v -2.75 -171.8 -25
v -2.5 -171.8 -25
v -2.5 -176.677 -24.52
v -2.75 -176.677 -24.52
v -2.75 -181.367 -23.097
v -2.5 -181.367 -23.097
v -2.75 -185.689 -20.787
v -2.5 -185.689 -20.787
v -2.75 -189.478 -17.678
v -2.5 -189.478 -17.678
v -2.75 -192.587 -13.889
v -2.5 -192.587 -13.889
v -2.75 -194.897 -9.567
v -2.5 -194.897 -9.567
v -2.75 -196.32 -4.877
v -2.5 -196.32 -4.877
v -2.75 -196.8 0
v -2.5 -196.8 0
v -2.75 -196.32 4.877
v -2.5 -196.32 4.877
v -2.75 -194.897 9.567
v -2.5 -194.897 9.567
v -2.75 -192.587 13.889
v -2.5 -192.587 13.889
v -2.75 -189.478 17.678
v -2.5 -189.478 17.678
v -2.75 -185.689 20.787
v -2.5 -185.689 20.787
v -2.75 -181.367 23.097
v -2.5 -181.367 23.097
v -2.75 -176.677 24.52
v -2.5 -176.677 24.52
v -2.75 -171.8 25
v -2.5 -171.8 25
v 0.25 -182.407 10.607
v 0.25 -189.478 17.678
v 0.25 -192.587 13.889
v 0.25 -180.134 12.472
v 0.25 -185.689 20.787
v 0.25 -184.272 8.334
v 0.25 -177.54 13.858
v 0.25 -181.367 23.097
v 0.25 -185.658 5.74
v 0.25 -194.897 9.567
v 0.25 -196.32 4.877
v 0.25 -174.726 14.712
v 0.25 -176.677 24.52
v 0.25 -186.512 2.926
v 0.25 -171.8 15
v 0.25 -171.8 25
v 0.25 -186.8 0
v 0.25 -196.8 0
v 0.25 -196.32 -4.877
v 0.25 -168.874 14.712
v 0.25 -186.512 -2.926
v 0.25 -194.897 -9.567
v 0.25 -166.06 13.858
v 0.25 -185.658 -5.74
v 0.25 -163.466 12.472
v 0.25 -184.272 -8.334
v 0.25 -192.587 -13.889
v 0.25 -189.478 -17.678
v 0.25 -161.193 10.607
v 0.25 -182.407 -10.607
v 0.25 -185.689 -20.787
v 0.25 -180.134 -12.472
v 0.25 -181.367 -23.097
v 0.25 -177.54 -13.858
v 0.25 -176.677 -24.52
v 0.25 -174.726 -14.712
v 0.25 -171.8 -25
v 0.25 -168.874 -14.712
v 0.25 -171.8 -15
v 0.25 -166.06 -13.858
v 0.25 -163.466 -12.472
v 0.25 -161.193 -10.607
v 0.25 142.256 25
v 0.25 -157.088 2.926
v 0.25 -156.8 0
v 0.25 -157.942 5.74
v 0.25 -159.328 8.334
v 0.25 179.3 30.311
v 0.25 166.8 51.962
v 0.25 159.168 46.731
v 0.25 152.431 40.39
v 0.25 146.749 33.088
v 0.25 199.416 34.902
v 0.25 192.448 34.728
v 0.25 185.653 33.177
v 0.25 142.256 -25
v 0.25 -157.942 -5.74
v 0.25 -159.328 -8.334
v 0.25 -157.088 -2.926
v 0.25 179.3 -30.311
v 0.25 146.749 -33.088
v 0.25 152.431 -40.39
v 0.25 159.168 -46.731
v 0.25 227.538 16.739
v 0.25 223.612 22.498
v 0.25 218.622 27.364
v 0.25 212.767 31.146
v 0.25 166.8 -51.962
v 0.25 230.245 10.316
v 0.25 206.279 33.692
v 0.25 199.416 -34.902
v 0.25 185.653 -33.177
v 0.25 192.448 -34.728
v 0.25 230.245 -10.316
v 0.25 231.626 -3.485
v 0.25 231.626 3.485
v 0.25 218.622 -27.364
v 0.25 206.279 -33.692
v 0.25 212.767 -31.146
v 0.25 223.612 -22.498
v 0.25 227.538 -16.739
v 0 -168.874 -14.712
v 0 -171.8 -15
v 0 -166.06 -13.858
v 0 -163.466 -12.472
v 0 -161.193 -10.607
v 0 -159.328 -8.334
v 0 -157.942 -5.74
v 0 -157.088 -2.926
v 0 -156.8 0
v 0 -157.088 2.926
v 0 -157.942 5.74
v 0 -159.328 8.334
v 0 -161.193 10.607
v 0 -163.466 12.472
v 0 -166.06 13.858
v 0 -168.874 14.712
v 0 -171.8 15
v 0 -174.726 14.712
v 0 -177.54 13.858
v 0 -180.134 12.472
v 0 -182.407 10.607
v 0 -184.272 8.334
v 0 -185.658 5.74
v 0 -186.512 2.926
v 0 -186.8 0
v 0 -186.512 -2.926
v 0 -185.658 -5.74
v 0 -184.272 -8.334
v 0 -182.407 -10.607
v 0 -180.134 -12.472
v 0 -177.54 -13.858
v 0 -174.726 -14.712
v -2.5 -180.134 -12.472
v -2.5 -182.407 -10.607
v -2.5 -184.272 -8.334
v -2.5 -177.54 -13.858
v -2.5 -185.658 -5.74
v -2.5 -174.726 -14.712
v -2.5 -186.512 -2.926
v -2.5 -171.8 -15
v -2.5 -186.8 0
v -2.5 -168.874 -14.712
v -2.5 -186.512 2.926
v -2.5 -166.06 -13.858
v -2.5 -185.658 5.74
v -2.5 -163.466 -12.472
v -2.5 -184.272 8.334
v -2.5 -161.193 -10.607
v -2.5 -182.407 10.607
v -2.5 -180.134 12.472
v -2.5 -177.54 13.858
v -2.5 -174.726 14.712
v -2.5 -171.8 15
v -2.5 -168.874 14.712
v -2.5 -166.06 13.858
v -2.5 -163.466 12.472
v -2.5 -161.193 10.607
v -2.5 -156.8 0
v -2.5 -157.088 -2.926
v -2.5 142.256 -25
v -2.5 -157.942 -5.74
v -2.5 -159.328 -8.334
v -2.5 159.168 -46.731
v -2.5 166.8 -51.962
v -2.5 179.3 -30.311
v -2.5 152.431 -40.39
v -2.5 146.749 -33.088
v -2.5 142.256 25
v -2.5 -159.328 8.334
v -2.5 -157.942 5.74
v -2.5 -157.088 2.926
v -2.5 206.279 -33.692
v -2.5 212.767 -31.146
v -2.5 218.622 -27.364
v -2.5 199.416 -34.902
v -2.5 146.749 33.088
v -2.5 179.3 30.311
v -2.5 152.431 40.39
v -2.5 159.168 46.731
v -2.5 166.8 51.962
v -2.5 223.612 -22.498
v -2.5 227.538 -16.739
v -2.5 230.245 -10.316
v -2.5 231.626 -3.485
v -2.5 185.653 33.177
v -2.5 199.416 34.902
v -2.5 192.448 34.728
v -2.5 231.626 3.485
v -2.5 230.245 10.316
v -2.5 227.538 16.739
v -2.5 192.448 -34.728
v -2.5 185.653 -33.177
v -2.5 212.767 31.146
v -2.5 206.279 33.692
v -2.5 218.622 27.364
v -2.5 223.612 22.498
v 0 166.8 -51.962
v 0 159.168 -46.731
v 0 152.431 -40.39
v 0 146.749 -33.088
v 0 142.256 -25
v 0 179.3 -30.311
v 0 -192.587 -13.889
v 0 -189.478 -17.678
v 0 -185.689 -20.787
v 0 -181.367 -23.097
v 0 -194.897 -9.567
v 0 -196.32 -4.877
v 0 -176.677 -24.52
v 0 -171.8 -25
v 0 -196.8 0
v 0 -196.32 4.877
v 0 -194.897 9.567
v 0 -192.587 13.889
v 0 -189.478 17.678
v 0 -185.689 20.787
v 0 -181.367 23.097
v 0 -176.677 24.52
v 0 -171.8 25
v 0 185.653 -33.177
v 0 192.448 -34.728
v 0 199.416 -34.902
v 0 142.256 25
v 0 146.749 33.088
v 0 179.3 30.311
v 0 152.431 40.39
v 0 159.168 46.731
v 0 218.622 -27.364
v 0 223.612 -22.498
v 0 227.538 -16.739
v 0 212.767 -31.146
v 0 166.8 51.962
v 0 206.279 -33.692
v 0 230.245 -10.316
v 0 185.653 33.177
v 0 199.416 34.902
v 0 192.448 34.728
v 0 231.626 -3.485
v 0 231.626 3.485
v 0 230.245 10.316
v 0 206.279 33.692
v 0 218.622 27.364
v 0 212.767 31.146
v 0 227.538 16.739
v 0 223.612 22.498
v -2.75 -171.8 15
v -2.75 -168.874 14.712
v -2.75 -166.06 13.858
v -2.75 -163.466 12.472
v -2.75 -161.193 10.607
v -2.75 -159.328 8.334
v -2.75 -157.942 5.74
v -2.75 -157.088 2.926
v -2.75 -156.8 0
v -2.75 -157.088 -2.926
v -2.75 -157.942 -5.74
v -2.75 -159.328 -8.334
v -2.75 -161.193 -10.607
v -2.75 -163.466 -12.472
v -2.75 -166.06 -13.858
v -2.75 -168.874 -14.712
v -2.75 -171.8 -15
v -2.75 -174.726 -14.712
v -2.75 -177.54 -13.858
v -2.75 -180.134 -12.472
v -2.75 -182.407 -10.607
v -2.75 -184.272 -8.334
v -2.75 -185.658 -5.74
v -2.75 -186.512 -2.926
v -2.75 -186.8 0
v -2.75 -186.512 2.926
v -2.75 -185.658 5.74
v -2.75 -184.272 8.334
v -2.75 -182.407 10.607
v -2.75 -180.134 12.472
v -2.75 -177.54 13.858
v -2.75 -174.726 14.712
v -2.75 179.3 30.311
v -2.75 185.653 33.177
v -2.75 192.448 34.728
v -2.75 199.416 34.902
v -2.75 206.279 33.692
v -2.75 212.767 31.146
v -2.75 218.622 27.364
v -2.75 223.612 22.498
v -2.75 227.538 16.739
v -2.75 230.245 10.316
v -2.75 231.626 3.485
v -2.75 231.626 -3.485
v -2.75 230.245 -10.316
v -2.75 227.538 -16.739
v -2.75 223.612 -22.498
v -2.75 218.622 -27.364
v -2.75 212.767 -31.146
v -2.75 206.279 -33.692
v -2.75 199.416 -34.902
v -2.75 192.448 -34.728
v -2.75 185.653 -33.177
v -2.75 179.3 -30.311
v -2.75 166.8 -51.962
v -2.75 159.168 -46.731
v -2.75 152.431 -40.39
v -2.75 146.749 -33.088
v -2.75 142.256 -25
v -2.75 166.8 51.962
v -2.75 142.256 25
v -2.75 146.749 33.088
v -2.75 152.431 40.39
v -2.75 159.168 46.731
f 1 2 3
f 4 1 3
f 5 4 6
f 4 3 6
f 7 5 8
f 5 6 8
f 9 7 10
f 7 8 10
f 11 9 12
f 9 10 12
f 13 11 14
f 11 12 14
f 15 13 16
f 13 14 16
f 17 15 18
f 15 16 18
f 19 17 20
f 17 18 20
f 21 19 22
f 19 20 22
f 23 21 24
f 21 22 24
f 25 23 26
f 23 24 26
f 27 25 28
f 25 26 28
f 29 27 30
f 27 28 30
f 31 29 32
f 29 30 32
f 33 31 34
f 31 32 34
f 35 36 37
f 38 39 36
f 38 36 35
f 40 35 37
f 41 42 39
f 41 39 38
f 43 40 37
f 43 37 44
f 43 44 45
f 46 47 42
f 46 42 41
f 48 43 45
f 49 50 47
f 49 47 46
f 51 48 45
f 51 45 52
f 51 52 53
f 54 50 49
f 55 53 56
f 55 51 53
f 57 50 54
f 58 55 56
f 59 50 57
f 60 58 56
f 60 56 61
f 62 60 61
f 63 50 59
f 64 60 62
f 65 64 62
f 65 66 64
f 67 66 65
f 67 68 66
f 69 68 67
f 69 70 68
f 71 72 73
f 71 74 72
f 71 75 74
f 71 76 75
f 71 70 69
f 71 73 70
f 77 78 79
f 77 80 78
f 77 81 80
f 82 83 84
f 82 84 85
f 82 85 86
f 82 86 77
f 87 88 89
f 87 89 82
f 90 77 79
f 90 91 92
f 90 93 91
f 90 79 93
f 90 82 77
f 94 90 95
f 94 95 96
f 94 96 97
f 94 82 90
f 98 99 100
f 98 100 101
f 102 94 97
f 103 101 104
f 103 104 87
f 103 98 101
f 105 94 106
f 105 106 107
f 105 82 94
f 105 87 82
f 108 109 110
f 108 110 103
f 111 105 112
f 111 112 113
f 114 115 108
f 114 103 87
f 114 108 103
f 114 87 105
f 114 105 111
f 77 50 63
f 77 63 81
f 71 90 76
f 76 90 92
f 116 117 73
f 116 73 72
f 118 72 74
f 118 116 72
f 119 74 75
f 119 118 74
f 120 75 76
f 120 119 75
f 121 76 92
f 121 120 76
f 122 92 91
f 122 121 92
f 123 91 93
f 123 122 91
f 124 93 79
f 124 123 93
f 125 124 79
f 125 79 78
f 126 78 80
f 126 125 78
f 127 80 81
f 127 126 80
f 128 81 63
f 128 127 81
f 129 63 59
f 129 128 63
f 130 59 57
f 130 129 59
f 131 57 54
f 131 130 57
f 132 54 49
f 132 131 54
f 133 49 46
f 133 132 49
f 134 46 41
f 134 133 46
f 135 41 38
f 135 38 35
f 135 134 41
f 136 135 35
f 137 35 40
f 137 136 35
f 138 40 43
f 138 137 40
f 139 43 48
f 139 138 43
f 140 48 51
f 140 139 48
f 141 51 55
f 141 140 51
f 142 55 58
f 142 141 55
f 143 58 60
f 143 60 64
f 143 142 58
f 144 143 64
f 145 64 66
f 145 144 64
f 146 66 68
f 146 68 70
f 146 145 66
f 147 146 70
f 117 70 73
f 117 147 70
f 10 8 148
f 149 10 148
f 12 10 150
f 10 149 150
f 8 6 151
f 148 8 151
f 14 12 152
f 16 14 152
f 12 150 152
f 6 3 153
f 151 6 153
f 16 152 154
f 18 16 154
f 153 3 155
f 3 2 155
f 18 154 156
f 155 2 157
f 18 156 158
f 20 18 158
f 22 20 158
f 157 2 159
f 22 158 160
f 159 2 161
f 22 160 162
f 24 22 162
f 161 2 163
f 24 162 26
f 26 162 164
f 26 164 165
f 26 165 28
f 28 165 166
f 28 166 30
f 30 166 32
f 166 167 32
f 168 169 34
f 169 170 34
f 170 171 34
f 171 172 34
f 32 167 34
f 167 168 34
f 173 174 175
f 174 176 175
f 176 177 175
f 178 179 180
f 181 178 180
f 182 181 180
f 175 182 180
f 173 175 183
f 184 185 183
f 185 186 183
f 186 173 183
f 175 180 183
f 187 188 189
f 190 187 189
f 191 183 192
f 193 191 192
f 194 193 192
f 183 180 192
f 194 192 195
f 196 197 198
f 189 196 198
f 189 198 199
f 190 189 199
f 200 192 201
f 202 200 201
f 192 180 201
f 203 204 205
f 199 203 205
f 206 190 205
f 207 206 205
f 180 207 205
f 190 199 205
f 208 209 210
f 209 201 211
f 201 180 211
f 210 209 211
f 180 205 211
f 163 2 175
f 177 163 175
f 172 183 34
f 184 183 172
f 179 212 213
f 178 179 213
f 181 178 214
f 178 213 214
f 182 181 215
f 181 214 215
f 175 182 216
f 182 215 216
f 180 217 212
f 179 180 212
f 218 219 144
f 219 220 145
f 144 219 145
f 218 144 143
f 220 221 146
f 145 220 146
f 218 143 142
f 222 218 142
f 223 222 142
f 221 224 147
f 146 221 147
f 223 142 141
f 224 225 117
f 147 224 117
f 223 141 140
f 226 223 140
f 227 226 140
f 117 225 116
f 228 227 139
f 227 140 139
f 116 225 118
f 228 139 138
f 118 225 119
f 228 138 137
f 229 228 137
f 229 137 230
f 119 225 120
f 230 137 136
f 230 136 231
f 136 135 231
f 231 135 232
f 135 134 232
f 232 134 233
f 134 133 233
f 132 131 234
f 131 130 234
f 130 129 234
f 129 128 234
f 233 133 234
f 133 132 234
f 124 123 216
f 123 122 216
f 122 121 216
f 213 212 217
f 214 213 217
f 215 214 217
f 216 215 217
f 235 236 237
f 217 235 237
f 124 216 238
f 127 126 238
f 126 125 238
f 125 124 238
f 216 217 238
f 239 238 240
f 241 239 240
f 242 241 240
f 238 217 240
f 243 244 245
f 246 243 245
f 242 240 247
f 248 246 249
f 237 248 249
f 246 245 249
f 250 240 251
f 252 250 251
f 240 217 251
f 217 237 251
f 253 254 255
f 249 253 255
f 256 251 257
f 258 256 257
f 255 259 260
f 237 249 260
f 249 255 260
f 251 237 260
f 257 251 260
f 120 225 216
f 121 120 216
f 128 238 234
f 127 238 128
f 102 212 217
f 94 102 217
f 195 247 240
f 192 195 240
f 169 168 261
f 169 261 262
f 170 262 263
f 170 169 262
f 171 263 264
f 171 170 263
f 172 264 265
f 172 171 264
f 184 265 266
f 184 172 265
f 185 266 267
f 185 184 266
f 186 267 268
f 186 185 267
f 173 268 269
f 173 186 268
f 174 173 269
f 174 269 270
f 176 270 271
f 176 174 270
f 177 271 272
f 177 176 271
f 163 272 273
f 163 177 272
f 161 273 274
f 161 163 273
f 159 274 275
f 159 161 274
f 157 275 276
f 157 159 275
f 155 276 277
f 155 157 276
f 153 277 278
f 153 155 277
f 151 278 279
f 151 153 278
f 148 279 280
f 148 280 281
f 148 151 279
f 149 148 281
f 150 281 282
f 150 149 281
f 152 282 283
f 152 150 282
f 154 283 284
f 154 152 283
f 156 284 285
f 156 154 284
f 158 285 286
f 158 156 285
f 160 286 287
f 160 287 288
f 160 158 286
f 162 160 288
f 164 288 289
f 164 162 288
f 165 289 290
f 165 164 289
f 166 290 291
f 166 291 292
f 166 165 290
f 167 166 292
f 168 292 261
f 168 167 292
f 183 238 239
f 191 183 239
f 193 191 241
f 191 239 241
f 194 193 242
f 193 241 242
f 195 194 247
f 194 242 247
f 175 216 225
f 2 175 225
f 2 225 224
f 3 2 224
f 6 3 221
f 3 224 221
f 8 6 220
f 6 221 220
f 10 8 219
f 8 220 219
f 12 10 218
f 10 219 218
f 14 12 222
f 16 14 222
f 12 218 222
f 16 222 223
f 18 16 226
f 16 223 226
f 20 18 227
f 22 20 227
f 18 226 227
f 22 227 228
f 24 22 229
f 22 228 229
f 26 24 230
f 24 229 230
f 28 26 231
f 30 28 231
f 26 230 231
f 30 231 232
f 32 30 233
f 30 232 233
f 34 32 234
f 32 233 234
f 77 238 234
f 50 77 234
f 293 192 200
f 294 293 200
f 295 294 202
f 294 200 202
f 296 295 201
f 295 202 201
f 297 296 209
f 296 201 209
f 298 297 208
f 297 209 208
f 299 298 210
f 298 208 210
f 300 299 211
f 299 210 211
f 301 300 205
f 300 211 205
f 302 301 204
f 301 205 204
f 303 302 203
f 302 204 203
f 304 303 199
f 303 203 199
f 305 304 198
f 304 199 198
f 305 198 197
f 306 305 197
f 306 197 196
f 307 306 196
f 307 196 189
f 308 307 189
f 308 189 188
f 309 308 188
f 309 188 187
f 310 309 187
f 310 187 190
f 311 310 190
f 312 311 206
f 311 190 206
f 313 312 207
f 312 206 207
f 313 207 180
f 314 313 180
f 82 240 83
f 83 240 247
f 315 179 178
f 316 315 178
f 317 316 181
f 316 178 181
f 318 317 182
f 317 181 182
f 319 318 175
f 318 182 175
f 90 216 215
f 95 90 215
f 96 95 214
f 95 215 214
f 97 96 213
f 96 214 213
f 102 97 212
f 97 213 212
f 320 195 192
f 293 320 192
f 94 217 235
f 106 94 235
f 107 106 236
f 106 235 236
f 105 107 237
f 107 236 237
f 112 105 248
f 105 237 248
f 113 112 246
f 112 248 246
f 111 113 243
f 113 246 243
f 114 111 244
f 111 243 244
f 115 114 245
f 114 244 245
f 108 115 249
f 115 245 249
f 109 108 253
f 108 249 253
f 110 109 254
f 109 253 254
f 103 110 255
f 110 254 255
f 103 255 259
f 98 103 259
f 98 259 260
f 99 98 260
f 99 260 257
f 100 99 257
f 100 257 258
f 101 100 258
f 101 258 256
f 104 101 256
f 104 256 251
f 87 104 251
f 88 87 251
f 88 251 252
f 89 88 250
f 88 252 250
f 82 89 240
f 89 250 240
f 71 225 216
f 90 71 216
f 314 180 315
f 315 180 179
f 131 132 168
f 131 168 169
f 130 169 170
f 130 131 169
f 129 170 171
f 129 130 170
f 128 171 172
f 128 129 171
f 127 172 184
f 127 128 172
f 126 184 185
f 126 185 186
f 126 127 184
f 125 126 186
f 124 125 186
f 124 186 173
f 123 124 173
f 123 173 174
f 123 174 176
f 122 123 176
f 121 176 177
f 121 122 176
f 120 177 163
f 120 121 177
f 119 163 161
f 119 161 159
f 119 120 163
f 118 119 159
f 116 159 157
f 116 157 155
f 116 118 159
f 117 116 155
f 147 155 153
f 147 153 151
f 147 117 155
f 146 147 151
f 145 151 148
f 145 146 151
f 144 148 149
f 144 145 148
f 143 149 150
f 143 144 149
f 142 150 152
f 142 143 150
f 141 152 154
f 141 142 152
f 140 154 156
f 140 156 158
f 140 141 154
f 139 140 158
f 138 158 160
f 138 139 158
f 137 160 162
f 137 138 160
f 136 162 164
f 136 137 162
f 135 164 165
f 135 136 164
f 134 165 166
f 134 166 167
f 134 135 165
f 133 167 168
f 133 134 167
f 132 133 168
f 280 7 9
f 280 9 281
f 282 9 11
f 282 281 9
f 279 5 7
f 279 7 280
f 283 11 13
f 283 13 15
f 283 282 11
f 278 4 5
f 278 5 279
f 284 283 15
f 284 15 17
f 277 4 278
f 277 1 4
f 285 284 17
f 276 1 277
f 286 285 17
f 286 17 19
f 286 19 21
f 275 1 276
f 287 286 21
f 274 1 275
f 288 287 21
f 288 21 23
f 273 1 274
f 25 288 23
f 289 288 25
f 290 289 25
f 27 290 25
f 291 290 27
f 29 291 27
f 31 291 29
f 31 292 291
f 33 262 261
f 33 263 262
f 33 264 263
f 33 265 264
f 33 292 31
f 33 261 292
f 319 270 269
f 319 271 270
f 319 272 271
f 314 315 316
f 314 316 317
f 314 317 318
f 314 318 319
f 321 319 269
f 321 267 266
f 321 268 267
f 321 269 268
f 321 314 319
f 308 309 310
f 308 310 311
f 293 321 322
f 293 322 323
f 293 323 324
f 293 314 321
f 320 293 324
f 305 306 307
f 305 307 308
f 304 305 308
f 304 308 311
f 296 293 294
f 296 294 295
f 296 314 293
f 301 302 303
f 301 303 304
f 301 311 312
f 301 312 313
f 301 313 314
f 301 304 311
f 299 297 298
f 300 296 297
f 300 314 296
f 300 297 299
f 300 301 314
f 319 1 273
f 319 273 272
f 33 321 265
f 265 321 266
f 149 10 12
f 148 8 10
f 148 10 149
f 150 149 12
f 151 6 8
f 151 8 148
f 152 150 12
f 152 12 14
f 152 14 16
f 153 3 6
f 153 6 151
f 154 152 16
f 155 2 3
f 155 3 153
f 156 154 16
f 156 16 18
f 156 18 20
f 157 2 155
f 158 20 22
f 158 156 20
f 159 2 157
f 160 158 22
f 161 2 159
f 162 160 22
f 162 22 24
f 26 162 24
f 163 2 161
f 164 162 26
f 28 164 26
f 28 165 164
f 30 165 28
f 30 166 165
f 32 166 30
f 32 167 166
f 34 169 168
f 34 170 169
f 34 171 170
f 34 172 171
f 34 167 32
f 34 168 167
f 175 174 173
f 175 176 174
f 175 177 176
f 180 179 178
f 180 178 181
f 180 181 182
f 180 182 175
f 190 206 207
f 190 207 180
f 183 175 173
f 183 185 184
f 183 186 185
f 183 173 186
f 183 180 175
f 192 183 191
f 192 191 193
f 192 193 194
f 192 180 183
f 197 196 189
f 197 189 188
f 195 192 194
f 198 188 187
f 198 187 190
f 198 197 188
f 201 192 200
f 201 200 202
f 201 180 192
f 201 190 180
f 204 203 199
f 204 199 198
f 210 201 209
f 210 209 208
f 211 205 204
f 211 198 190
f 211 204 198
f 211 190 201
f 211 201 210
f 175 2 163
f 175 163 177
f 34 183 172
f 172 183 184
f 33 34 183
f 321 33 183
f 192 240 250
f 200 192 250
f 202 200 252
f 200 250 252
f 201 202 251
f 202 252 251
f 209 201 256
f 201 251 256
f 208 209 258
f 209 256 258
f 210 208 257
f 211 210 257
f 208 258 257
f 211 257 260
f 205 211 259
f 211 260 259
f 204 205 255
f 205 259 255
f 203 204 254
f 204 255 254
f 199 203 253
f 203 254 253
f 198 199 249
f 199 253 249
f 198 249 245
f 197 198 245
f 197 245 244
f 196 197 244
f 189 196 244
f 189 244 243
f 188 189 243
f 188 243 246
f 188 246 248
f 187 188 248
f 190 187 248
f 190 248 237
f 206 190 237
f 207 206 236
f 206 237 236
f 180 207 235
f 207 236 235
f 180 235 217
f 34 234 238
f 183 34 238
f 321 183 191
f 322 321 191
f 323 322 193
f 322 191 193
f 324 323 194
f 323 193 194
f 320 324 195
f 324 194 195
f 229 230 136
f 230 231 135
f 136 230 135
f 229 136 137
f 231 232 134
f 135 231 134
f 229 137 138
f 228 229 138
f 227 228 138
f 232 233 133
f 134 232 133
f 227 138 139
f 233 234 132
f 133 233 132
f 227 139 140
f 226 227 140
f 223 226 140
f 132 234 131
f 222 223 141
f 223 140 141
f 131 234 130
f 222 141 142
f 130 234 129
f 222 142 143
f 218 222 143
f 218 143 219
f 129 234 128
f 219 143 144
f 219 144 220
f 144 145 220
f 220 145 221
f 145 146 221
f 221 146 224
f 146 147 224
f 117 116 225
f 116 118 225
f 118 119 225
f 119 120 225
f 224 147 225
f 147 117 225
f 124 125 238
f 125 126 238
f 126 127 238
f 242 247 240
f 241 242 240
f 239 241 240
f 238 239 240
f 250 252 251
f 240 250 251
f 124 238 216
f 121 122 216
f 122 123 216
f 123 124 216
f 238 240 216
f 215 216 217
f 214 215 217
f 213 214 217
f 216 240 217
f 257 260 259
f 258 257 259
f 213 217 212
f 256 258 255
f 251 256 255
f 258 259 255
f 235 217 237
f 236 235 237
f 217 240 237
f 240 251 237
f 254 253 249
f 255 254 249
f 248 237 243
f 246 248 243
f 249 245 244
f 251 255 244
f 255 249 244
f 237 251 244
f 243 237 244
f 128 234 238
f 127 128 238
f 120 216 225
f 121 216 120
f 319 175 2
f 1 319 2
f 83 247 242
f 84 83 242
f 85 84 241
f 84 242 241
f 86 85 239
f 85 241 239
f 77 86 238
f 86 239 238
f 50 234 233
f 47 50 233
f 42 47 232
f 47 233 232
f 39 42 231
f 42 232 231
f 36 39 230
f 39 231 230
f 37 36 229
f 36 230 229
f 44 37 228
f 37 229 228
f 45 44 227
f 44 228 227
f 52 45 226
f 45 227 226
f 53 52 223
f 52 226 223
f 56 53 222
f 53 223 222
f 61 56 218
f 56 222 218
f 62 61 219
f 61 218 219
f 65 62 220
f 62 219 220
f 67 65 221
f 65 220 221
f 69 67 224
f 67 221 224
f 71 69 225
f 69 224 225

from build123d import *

# Parameters (mm, degrees)
SKETCH2_R           = 15
BOSS_EXTRUDE1_DEPTH = 0.25
SKETCH3_R           = 15
BOSS_EXTRUDE2_DEPTH = 2.5
SKETCH4_R           = 15
BOSS_EXTRUDE3_DEPTH = 0.25


with BuildPart() as part:
    # Sketch2 → Boss-Extrude1 (new body)
    with BuildSketch(Plane(origin=(0, 0, 0), x_dir=(0, 0, -1), z_dir=(1, 0, 0))):
        with BuildLine():
            Line((51.961524227, 166.8), (30.310889132, 179.3))
            ThreePointArc((30.310889132, 179.3), (0, 231.8), (-30.310889132, 179.3))
            Line((-30.310889132, 179.3), (-51.961524227, 166.8))
            ThreePointArc((-51.961524227, 166.8), (-40.390167668, 152.430704809), (-25, 142.256439427))
            Line((-25, 142.256439427), (-25, -171.8))
            ThreePointArc((-25, -171.8), (0, -196.8), (25, -171.8))
            Line((25, -171.8), (25, 142.256439427))
            ThreePointArc((25, 142.256439427), (40.390167668, 152.430704809), (51.961524227, 166.8))
        make_face()
        with Locations((0, -171.8)):
            Circle(SKETCH2_R, mode=Mode.SUBTRACT)
    extrude(amount=BOSS_EXTRUDE1_DEPTH)


with BuildPart() as body_2:
    # Sketch3 → Boss-Extrude2 (new body)
    with BuildSketch(Plane.ZY):
        with BuildLine():
            Line((51.961524227, 166.8), (30.310889132, 179.3))
            ThreePointArc((30.310889132, 179.3), (0, 231.8), (-30.310889132, 179.3))
            Line((-30.310889132, 179.3), (-51.961524227, 166.8))
            ThreePointArc((-51.961524227, 166.8), (-40.390167668, 152.430704809), (-25, 142.256439427))
            Line((-25, 142.256439427), (-25, -171.8))
            ThreePointArc((-25, -171.8), (0, -196.8), (25, -171.8))
            Line((25, -171.8), (25, 142.256439427))
            ThreePointArc((25, 142.256439427), (40.390167668, 152.430704809), (51.961524227, 166.8))
        make_face()
        with Locations((0, -171.8)):
            Circle(SKETCH3_R, mode=Mode.SUBTRACT)
    extrude(amount=BOSS_EXTRUDE2_DEPTH)


with BuildPart() as body_3:
    # Sketch4 → Boss-Extrude3 (new body)
    with BuildSketch(Plane.ZY.offset(2.5)):
        with BuildLine():
            ThreePointArc((25, 142.256439427), (40.390167668, 152.430704809), (51.961524227, 166.8))
            Line((51.961524227, 166.8), (30.310889132, 179.3))
            ThreePointArc((30.310889132, 179.3), (0, 231.8), (-30.310889132, 179.3))
            Line((-30.310889132, 179.3), (-51.961524227, 166.8))
            ThreePointArc((-51.961524227, 166.8), (-40.390167668, 152.430704809), (-25, 142.256439427))
            Line((-25, 142.256439427), (-25, -171.8))
            ThreePointArc((-25, -171.8), (0, -196.8), (25, -171.8))
            Line((25, -171.8), (25, 142.256439427))
        make_face()
        with Locations((0, -171.8)):
            Circle(SKETCH4_R, mode=Mode.SUBTRACT)
    extrude(amount=BOSS_EXTRUDE3_DEPTH)


solid = Compound([part.part, body_2.part, body_3.part])
